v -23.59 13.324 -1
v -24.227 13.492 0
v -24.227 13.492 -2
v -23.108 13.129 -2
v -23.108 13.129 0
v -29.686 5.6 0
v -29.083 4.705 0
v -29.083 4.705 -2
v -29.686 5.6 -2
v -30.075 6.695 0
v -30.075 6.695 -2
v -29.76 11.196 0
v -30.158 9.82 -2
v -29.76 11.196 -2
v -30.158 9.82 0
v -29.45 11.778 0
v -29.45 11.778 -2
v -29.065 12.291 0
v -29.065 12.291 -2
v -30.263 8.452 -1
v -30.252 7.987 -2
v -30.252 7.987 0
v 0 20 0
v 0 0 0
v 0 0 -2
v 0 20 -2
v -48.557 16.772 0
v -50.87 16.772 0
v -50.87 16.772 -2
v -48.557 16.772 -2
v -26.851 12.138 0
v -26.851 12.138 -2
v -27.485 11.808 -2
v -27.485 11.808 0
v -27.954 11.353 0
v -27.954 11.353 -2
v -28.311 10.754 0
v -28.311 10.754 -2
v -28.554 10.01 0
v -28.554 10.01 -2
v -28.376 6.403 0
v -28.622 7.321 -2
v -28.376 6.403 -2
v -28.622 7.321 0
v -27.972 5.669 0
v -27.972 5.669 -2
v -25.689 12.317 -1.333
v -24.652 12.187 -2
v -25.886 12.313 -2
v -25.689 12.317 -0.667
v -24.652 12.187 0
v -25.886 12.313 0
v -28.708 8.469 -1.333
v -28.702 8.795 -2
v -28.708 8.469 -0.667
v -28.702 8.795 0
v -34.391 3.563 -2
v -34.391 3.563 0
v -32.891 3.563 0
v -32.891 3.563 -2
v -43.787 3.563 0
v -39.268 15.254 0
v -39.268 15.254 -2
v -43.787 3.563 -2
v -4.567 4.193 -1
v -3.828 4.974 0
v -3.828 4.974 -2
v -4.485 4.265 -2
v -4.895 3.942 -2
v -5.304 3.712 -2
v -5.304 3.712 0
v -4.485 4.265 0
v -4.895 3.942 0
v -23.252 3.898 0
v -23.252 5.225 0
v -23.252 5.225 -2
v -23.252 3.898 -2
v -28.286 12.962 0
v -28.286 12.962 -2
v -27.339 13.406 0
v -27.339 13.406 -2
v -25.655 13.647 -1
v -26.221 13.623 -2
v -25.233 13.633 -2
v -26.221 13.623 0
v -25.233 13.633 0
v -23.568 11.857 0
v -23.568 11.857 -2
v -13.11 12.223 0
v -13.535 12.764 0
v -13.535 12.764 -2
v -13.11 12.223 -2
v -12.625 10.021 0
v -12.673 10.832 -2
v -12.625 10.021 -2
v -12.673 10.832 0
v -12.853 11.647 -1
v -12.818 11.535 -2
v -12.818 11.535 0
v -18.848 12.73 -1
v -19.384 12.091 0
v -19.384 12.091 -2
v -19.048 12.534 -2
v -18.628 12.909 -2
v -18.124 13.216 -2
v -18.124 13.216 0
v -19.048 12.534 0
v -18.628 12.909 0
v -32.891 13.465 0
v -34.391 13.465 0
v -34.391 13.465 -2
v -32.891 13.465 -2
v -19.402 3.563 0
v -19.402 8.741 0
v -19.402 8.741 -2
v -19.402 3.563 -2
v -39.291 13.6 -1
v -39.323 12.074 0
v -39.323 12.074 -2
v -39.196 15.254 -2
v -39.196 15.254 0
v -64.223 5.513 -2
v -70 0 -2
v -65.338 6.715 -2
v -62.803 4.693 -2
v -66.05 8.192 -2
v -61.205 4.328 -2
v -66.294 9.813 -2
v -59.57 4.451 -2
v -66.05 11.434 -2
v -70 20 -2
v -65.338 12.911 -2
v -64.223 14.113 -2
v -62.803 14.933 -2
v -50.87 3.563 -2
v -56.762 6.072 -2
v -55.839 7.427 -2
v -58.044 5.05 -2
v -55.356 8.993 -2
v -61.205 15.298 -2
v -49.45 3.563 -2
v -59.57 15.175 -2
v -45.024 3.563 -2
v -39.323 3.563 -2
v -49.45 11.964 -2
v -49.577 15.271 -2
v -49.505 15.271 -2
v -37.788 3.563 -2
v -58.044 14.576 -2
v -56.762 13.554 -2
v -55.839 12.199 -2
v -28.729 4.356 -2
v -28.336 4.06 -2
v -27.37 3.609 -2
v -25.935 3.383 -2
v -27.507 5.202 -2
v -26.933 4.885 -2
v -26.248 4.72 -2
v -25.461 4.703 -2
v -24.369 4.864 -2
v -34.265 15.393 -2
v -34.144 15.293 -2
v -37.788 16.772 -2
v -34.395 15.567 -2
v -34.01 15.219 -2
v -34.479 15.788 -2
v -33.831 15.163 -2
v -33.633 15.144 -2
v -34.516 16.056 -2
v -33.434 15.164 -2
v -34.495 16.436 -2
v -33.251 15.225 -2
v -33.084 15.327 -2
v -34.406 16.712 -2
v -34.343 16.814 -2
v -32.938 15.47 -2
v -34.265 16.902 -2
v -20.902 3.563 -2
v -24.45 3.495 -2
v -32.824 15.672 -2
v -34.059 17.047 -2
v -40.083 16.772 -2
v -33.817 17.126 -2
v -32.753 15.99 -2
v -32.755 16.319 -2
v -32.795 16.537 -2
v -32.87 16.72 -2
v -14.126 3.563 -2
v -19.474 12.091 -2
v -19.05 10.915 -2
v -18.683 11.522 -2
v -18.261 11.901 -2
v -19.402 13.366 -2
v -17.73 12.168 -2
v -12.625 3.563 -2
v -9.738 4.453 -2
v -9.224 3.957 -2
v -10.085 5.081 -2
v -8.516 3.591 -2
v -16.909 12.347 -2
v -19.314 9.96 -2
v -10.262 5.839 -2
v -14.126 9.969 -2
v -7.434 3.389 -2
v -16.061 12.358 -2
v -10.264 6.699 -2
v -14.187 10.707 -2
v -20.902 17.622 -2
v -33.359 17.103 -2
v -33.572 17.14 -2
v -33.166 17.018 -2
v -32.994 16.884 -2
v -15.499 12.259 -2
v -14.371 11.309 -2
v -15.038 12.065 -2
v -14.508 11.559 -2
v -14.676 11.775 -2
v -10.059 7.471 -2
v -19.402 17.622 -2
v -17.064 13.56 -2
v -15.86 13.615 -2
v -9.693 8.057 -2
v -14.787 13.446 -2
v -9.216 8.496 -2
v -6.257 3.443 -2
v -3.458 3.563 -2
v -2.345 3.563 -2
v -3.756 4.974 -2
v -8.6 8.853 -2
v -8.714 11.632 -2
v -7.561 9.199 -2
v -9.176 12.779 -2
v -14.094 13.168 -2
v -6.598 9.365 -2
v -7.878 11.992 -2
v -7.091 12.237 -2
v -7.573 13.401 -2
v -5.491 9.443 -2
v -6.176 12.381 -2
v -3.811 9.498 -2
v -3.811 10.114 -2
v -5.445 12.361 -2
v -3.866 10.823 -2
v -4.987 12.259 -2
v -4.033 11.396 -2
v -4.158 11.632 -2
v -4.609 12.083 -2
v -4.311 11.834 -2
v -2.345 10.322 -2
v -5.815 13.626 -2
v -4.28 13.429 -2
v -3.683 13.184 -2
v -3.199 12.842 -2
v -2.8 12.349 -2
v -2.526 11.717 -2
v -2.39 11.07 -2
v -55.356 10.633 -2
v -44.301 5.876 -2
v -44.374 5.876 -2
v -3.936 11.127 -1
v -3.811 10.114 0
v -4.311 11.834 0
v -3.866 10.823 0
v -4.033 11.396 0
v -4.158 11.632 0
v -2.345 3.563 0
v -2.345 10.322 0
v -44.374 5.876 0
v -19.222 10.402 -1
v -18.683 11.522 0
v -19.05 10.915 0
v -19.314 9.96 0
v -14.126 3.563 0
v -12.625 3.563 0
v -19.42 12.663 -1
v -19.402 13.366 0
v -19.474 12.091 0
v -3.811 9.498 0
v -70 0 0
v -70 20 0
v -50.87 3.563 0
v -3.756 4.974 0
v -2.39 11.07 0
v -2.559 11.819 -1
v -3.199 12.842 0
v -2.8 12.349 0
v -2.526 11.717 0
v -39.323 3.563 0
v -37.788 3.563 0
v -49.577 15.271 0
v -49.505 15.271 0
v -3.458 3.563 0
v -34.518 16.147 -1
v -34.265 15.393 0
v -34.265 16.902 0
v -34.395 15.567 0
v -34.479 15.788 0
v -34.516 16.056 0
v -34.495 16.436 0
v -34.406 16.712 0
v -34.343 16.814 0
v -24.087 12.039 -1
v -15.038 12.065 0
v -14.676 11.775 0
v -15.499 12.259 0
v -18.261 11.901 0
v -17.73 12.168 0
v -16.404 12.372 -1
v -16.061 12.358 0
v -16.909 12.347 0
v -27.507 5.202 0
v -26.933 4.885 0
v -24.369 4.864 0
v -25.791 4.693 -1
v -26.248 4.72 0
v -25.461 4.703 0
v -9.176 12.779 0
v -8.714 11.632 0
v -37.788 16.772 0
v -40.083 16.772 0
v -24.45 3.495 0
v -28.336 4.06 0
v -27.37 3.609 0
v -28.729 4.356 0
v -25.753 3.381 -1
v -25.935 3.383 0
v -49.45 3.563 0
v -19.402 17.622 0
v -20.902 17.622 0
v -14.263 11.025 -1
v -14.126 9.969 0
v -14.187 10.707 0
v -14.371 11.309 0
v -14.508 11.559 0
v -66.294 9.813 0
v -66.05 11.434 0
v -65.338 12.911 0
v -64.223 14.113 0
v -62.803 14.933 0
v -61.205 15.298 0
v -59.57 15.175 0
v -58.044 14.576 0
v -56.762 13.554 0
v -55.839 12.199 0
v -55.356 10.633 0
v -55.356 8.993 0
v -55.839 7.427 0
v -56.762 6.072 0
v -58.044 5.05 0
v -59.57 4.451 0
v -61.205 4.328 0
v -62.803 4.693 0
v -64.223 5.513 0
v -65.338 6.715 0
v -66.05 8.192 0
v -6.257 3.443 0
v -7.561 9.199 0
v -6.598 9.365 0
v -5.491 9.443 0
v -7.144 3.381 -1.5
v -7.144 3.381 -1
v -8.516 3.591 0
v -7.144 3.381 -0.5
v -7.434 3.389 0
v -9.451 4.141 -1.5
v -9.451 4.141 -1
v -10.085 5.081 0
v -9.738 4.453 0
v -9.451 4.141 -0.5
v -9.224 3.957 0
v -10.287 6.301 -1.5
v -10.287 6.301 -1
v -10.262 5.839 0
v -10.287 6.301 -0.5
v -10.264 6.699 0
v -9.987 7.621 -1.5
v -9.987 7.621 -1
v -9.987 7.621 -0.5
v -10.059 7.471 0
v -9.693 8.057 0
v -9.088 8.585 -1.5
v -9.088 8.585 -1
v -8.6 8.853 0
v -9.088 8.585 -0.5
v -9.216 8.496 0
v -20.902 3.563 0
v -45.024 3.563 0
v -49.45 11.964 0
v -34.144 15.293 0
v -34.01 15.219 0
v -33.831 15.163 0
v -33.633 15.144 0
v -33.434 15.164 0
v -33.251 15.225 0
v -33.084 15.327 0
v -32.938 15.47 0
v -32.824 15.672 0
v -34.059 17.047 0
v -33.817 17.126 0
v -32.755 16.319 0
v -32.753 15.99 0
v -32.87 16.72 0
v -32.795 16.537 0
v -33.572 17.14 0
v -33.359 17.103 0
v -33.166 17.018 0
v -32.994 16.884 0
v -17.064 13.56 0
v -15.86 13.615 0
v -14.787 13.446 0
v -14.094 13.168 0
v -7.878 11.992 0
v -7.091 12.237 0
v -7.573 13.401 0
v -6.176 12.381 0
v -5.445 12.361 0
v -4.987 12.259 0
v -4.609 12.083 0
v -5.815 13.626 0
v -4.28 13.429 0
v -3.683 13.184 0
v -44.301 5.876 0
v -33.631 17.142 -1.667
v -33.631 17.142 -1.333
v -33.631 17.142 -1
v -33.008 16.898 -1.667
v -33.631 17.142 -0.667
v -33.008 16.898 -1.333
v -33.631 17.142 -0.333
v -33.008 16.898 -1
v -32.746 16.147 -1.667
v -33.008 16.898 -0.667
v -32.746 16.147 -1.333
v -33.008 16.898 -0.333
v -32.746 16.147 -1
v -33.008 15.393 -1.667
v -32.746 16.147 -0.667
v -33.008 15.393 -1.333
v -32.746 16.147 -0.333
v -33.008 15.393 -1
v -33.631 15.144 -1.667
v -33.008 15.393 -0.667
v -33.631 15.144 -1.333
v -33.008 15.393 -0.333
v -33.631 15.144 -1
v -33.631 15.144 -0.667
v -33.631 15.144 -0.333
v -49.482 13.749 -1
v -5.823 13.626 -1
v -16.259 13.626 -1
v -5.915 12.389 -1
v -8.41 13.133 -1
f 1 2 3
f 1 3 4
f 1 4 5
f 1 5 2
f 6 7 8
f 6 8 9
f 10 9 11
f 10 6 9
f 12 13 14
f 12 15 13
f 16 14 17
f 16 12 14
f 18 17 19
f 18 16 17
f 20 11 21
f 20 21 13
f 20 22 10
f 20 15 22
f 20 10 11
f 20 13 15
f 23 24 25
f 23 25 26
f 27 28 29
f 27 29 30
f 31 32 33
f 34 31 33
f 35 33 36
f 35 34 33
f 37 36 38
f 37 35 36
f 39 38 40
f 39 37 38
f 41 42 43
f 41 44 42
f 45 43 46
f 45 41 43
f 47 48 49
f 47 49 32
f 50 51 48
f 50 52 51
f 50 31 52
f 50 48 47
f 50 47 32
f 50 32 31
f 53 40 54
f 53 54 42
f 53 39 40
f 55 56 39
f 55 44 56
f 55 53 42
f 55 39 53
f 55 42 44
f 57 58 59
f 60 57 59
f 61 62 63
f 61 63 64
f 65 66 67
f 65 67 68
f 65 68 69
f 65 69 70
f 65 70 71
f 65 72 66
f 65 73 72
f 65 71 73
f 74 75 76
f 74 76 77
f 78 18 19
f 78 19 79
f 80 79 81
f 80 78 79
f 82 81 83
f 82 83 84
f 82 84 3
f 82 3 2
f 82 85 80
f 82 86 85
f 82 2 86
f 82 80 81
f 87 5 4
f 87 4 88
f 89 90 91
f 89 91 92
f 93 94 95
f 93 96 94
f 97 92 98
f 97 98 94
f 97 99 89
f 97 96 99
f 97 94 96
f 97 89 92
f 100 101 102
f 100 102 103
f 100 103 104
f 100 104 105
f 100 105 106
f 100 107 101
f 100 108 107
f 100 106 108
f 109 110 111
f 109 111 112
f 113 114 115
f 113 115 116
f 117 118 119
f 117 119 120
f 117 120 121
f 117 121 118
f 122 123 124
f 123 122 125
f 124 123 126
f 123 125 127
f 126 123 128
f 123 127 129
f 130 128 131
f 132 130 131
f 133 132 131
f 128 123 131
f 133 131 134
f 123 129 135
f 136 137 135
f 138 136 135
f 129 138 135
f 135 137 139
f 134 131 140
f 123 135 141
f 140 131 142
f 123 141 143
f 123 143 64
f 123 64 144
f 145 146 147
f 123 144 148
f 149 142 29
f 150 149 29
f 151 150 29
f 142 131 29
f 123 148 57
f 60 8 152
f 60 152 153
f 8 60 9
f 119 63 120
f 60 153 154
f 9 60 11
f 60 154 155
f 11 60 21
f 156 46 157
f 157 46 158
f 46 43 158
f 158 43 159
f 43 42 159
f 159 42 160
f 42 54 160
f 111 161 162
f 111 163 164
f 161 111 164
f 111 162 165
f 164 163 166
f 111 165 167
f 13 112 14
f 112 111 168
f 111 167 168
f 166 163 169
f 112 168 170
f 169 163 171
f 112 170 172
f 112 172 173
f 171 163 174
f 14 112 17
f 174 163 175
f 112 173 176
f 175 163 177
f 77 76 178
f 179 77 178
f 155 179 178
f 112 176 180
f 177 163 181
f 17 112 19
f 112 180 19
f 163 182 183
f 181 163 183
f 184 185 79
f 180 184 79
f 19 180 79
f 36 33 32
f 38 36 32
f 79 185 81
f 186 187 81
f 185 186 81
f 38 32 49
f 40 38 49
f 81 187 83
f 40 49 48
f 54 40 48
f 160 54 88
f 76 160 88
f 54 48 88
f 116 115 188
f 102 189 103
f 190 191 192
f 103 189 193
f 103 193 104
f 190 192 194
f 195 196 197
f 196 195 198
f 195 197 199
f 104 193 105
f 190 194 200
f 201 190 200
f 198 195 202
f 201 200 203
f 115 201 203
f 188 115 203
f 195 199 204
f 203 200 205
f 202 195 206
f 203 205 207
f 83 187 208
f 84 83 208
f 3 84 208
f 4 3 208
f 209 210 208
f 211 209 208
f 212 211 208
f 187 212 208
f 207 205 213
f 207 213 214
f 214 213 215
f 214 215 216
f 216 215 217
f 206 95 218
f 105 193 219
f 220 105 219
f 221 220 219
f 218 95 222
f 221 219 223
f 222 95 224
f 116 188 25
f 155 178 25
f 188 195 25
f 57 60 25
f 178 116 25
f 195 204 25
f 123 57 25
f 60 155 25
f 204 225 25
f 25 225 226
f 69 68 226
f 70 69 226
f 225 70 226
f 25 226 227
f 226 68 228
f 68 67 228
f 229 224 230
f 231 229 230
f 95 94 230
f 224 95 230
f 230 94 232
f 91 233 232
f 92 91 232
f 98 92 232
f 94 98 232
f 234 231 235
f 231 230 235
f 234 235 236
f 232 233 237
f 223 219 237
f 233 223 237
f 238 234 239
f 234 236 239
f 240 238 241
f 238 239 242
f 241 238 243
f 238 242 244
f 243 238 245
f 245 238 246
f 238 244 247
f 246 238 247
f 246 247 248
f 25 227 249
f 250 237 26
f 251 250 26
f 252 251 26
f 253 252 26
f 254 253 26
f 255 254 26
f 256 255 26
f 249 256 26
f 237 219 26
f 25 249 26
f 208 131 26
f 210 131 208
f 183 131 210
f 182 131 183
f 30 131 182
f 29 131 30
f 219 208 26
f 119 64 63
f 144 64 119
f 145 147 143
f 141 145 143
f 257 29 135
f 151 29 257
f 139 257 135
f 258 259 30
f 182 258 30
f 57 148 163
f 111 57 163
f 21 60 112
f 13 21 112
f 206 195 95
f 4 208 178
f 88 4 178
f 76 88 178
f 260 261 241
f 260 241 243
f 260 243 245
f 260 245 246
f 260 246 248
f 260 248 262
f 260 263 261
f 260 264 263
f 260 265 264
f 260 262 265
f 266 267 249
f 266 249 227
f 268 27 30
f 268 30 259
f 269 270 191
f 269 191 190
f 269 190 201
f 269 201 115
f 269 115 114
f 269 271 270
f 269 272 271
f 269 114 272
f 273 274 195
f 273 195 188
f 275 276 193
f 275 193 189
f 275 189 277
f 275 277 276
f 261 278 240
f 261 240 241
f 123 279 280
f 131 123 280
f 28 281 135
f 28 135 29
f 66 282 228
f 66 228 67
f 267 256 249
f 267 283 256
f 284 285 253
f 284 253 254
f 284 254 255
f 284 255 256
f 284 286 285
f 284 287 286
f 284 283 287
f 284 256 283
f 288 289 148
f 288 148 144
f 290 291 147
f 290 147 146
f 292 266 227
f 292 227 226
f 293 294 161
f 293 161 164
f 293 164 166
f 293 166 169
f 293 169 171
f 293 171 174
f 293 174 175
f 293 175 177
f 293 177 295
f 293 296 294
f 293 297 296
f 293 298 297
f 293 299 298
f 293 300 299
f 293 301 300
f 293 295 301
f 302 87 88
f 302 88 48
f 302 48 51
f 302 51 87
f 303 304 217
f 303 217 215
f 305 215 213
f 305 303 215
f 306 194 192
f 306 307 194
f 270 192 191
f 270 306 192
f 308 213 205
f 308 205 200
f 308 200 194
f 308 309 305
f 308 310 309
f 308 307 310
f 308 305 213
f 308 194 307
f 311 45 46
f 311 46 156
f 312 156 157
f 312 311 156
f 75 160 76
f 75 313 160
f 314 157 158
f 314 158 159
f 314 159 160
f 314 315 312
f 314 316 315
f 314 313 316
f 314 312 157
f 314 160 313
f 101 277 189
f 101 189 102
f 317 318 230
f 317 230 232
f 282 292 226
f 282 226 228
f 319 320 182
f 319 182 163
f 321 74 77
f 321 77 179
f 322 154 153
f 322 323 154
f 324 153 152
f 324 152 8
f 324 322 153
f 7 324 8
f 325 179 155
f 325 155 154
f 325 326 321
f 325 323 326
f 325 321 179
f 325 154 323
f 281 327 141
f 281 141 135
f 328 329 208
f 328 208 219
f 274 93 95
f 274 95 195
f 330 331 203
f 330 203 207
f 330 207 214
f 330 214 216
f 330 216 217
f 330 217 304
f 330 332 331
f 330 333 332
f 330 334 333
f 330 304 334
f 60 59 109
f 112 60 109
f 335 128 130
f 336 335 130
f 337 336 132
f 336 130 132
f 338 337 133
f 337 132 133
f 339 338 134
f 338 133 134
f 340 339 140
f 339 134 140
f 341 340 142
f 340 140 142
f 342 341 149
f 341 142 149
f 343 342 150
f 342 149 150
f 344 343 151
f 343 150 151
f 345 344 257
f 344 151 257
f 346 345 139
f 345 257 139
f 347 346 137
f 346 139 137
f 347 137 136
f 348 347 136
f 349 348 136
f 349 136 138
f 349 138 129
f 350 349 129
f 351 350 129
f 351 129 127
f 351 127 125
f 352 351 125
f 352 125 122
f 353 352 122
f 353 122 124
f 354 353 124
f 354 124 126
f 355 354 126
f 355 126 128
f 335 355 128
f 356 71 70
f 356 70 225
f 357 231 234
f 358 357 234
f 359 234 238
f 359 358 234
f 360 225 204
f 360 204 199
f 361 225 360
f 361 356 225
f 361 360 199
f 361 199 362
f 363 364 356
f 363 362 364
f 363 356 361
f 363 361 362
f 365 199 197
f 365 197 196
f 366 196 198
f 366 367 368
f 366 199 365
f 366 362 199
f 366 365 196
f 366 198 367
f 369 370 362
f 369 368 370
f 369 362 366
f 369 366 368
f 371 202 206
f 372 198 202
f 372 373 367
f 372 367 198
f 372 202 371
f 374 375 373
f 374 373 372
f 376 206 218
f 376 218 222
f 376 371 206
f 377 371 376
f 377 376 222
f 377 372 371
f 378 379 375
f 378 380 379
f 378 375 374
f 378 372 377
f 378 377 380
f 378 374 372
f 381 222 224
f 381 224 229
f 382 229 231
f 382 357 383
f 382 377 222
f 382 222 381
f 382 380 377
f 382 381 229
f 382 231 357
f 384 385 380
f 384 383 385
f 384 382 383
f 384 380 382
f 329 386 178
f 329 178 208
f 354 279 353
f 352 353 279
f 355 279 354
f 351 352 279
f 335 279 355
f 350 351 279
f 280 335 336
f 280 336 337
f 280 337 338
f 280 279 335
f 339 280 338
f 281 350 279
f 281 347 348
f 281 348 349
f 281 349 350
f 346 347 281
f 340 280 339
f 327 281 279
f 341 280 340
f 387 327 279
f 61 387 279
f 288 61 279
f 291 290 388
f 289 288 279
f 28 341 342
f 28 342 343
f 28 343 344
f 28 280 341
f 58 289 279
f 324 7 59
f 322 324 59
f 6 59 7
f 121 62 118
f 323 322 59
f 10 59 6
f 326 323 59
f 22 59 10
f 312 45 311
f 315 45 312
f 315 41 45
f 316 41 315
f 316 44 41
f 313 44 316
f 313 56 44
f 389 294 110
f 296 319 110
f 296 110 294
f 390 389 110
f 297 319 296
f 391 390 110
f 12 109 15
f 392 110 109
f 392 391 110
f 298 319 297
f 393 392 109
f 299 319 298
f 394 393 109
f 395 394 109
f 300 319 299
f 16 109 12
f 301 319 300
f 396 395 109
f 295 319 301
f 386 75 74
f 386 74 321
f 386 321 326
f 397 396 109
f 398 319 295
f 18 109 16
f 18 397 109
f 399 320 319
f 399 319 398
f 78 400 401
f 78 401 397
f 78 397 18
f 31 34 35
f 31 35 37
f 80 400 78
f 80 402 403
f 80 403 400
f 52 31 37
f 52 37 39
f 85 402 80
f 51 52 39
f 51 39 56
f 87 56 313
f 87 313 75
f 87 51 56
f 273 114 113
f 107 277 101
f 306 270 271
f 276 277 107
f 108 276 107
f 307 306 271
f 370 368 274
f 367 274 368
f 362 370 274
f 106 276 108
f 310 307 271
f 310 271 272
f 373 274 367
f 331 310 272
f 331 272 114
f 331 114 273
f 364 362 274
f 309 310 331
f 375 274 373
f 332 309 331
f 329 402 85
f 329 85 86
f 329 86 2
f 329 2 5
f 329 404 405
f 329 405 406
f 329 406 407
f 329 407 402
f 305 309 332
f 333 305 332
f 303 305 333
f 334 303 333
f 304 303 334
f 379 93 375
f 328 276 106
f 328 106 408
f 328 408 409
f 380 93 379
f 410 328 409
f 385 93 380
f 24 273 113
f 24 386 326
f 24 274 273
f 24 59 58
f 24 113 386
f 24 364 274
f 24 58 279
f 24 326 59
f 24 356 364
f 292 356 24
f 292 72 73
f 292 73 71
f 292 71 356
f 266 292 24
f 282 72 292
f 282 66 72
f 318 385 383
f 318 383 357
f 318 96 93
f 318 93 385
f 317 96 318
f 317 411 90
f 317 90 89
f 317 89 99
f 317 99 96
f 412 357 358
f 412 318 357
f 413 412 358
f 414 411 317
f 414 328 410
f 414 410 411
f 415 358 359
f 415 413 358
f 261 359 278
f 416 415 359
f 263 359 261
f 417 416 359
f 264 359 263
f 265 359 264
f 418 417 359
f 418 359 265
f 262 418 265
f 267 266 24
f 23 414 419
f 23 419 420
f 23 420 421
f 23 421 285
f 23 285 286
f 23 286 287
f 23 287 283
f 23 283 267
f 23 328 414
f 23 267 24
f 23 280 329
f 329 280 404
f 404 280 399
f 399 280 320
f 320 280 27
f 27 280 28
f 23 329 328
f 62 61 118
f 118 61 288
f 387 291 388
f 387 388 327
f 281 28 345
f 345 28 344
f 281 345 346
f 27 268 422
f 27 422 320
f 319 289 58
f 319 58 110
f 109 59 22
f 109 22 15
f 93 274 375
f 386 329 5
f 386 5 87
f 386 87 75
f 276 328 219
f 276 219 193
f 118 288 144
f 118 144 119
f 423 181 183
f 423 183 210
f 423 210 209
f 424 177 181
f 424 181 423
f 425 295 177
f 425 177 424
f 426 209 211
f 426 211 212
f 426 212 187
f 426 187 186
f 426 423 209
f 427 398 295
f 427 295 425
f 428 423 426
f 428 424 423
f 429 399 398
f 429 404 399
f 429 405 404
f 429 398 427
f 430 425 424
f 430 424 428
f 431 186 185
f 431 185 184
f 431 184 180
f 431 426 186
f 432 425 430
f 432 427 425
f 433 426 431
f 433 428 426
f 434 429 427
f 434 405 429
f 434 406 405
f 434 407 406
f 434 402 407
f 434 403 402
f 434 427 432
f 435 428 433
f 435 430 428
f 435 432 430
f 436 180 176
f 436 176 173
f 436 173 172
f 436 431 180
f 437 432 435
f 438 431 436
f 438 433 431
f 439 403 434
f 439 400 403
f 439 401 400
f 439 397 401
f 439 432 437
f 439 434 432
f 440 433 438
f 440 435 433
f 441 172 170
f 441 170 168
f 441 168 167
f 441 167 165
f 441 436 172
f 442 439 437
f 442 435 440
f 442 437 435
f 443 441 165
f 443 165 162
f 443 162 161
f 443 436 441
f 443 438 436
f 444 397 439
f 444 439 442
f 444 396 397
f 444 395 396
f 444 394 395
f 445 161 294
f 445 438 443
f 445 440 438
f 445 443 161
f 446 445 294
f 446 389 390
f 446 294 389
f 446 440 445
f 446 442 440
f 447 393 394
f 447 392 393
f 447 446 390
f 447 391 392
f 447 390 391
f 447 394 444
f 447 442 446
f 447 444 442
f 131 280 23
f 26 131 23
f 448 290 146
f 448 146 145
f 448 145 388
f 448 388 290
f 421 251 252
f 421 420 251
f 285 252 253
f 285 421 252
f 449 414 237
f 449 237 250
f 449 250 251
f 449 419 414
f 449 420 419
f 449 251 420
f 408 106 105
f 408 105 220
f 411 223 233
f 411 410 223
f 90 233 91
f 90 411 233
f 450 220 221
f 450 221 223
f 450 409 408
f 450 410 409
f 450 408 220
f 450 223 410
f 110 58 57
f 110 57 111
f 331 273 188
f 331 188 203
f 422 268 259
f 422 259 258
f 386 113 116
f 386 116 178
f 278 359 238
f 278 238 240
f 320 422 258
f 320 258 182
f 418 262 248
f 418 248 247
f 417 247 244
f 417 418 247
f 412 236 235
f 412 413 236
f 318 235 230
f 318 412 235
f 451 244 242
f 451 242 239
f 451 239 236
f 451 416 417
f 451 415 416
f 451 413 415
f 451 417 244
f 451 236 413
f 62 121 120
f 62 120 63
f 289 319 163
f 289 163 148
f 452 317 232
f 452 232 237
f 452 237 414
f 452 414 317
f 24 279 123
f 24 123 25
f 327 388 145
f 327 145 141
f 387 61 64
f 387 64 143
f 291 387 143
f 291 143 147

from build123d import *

# Parameters (mm, degrees)
F0_W     = 70
F0_H     = 20
F0_W_2   = 1.5003956149
F0_H_2   = 9.901454684
F2_DEPTH = 2
F3_D     = 11
F3_DEPTH = 17
F3_TIP   = 3.3047334047


with BuildPart() as f2:
    # F0 (on Top) → F2 (new body)
    with BuildSketch(Plane.XY):
        with Locations((-35, 10)):
            Rectangle(F0_W, F0_H)
        with Locations((-33.6410080478, 8.5138517956)):
            Rectangle(F0_W_2, F0_H_2, mode=Mode.SUBTRACT)
        with BuildLine():
            add(Edge.make_bspline(
                [(-23.2524307027, 3.8984729919), (-24.244021639, 3.3809955062), (-25.7530900609, 3.3809955062)],
                knots=[0, 0, 0, 1, 1, 1], degree=2))
            add(Edge.make_bspline(
                [(-25.7530900609, 3.3809955062), (-27.9039462025, 3.3809955062), (-29.0834479575, 4.7050440449)],
                knots=[0, 0, 0, 1, 1, 1], degree=2))
            add(Edge.make_bspline(
                [(-29.0834479575, 4.7050440449), (-30.2629497126, 6.0290925837), (-30.2629497126, 8.4516966786)],
                knots=[0, 0, 0, 1, 1, 1], degree=2))
            add(Edge.make_bspline(
                [(-30.2629497126, 8.4516966786), (-30.2629497126, 10.9350104228), (-29.0646568756, 12.2908592539)],
                knots=[0, 0, 0, 1, 1, 1], degree=2))
            add(Edge.make_bspline(
                [(-29.0646568756, 12.2908592539), (-27.8663640387, 13.6467080851), (-25.654798248, 13.6467080851)],
                knots=[0, 0, 0, 1, 1, 1], degree=2))
            add(Edge.make_bspline(
                [(-25.654798248, 13.6467080851), (-24.9407371365, 13.6467080851), (-24.2266760249, 13.4920430265)],
                knots=[0, 0, 0, 1, 1, 1], degree=2))
            add(Edge.make_bspline(
                [(-24.2266760249, 13.4920430265), (-23.5126149134, 13.337377968), (-23.107883919, 13.1292305994)],
                knots=[0, 0, 0, 1, 1, 1], degree=2))
            Line((-23.107883919, 13.1292305994), (-23.5675426912, 11.8572189028))
            add(Edge.make_bspline(
                [(-23.5675426912, 11.8572189028), (-24.0647836272, 12.0566934643), (-24.651643569, 12.1867855697)],
                knots=[0, 0, 0, 1, 1, 1], degree=2))
            add(Edge.make_bspline(
                [(-24.651643569, 12.1867855697), (-25.2385035109, 12.316877675), (-25.6894894761, 12.316877675)],
                knots=[0, 0, 0, 1, 1, 1], degree=2))
            add(Edge.make_bspline(
                [(-25.6894894761, 12.316877675), (-28.7076263199, 12.316877675), (-28.7076263199, 8.4690422927)],
                knots=[0, 0, 0, 1, 1, 1], degree=2))
            add(Edge.make_bspline(
                [(-28.7076263199, 8.4690422927), (-28.7076263199, 6.6448618823), (-27.9718831908, 5.6691710923)],
                knots=[0, 0, 0, 1, 1, 1], degree=2))
            add(Edge.make_bspline(
                [(-27.9718831908, 5.6691710923), (-27.2361400617, 4.6934803022), (-25.7906722247, 4.6934803022)],
                knots=[0, 0, 0, 1, 1, 1], degree=2))
            add(Edge.make_bspline(
                [(-25.7906722247, 4.6934803022), (-24.5533517561, 4.6934803022), (-23.2524307027, 5.2254124663)],
                knots=[0, 0, 0, 1, 1, 1], degree=2))
            Line((-23.2524307027, 5.2254124663), (-23.2524307027, 3.8984729919))
        make_face(mode=Mode.SUBTRACT)
        with BuildLine():
            Line((-2.3451839072, 3.5631244536), (-3.4581941418, 3.5631244536))
            Line((-3.4581941418, 3.5631244536), (-3.7559605162, 4.9739010626))
            Line((-3.7559605162, 4.9739010626), (-3.8282339081, 4.9739010626))
            add(Edge.make_bspline(
                [(-3.8282339081, 4.9739010626), (-4.5683134407, 4.0430197756), (-5.3040565697, 3.7120076409)],
                knots=[0, 0, 0, 1, 1, 1], degree=2))
            add(Edge.make_bspline(
                [(-5.3040565697, 3.7120076409), (-6.0397996988, 3.3809955062), (-7.1441371263, 3.3809955062)],
                knots=[0, 0, 0, 1, 1, 1], degree=2))
            add(Edge.make_bspline(
                [(-7.1441371263, 3.3809955062), (-8.6156233845, 3.3809955062), (-9.4511037943, 4.1413115885)],
                knots=[0, 0, 0, 1, 1, 1], degree=2))
            add(Edge.make_bspline(
                [(-9.4511037943, 4.1413115885), (-10.2865842041, 4.9016276708), (-10.2865842041, 6.3008405371)],
                knots=[0, 0, 0, 1, 1, 1], degree=2))
            add(Edge.make_bspline(
                [(-10.2865842041, 6.3008405371), (-10.2865842041, 9.2987408312), (-5.4905219207, 9.4432876149)],
                knots=[0, 0, 0, 1, 1, 1], degree=2))
            Line((-5.4905219207, 9.4432876149), (-3.810888294, 9.4982153927))
            Line((-3.810888294, 9.4982153927), (-3.810888294, 10.1139846913))
            add(Edge.make_bspline(
                [(-3.810888294, 10.1139846913), (-3.810888294, 11.279031768), (-4.3110201657, 11.8340914174)],
                knots=[0, 0, 0, 1, 1, 1], degree=2))
            add(Edge.make_bspline(
                [(-4.3110201657, 11.8340914174), (-4.8111520373, 12.3891510669), (-5.9154894648, 12.3891510669)],
                knots=[0, 0, 0, 1, 1, 1], degree=2))
            add(Edge.make_bspline(
                [(-5.9154894648, 12.3891510669), (-7.1528099334, 12.3891510669), (-8.7139151974, 11.6317259202)],
                knots=[0, 0, 0, 1, 1, 1], degree=2))
            Line((-8.7139151974, 11.6317259202), (-9.1764649053, 12.7794273829))
            add(Edge.make_bspline(
                [(-9.1764649053, 12.7794273829), (-8.4450581797, 13.1754855702), (-7.5734410739, 13.4009785528)],
                knots=[0, 0, 0, 1, 1, 1], degree=2))
            add(Edge.make_bspline(
                [(-7.5734410739, 13.4009785528), (-6.7018239682, 13.6264715354), (-5.8229795232, 13.6264715354)],
                knots=[0, 0, 0, 1, 1, 1], degree=2))
            add(Edge.make_bspline(
                [(-5.8229795232, 13.6264715354), (-4.0537268907, 13.6264715354), (-3.1994553989, 12.8415824999)],
                knots=[0, 0, 0, 1, 1, 1], degree=2))
            add(Edge.make_bspline(
                [(-3.1994553989, 12.8415824999), (-2.3451839072, 12.0566934643), (-2.3451839072, 10.3221320598)],
                knots=[0, 0, 0, 1, 1, 1], degree=2))
            Line((-2.3451839072, 10.3221320598), (-2.3451839072, 3.5631244536))
        make_face(mode=Mode.SUBTRACT)
        with BuildLine():
            Line((-43.7867467963, 3.5631244536), (-45.0240672648, 3.5631244536))
            Line((-45.0240672648, 3.5631244536), (-49.5050175598, 15.271413934))
            Line((-49.5050175598, 15.271413934), (-49.5772909516, 15.271413934))
            add(Edge.make_bspline(
                [(-49.5772909516, 15.271413934), (-49.450089782, 13.8808738747), (-49.450089782, 11.9641835228)],
                knots=[0, 0, 0, 1, 1, 1], degree=2))
            Line((-49.450089782, 11.9641835228), (-49.450089782, 3.5631244536))
            Line((-49.450089782, 3.5631244536), (-50.869539198, 3.5631244536))
            Line((-50.869539198, 3.5631244536), (-50.869539198, 16.7718095489))
            Line((-50.869539198, 16.7718095489), (-48.5567906586, 16.7718095489))
            Line((-48.5567906586, 16.7718095489), (-44.3736067381, 5.875872993))
            Line((-44.3736067381, 5.875872993), (-44.3013333463, 5.875872993))
            Line((-44.3013333463, 5.875872993), (-40.0834581977, 16.7718095489))
            Line((-40.0834581977, 16.7718095489), (-37.7880552724, 16.7718095489))
            Line((-37.7880552724, 16.7718095489), (-37.7880552724, 3.5631244536))
            Line((-37.7880552724, 3.5631244536), (-39.3231421154, 3.5631244536))
            Line((-39.3231421154, 3.5631244536), (-39.3231421154, 12.0740390784))
            add(Edge.make_bspline(
                [(-39.3231421154, 12.0740390784), (-39.3231421154, 13.5368525295), (-39.1959409457, 15.2540683199)],
                knots=[0, 0, 0, 1, 1, 1], degree=2))
            Line((-39.1959409457, 15.2540683199), (-39.2682143376, 15.2540683199))
            Line((-39.2682143376, 15.2540683199), (-43.7867467963, 3.5631244536))
        make_face(mode=Mode.SUBTRACT)
        with BuildLine():
            Line((-12.6253511645, 3.5631244536), (-14.1257467794, 3.5631244536))
            Line((-14.1257467794, 3.5631244536), (-14.1257467794, 9.9694379076))
            add(Edge.make_bspline(
                [(-14.1257467794, 9.9694379076), (-14.1257467794, 11.1778490194), (-14.6764700254, 11.7748272361)],
                knots=[0, 0, 0, 1, 1, 1], degree=2))
            add(Edge.make_bspline(
                [(-14.6764700254, 11.7748272361), (-15.2271932713, 12.3718054528), (-16.4038040907, 12.3718054528)],
                knots=[0, 0, 0, 1, 1, 1], degree=2))
            add(Edge.make_bspline(
                [(-16.4038040907, 12.3718054528), (-17.9649093547, 12.3718054528), (-18.6833068697, 11.5218703646)],
                knots=[0, 0, 0, 1, 1, 1], degree=2))
            add(Edge.make_bspline(
                [(-18.6833068697, 11.5218703646), (-19.4017043848, 10.6719352764), (-19.4017043848, 8.7407902461)],
                knots=[0, 0, 0, 1, 1, 1], degree=2))
            Line((-19.4017043848, 8.7407902461), (-19.4017043848, 3.5631244536))
            Line((-19.4017043848, 3.5631244536), (-20.9020999997, 3.5631244536))
            Line((-20.9020999997, 3.5631244536), (-20.9020999997, 17.6217446371))
            Line((-20.9020999997, 17.6217446371), (-19.4017043848, 17.6217446371))
            Line((-19.4017043848, 17.6217446371), (-19.4017043848, 13.3662873247))
            add(Edge.make_bspline(
                [(-19.4017043848, 13.3662873247), (-19.4017043848, 12.5972984354), (-19.4739777766, 12.0913846924)],
                knots=[0, 0, 0, 1, 1, 1], degree=2))
            Line((-19.4739777766, 12.0913846924), (-19.3843587707, 12.0913846924))
            add(Edge.make_bspline(
                [(-19.3843587707, 12.0913846924), (-18.9420456126, 12.8054458039), (-18.1239108168, 13.2159586697)],
                knots=[0, 0, 0, 1, 1, 1], degree=2))
            add(Edge.make_bspline(
                [(-18.1239108168, 13.2159586697), (-17.305776021, 13.6264715354), (-16.259257307, 13.6264715354)],
                knots=[0, 0, 0, 1, 1, 1], degree=2))
            add(Edge.make_bspline(
                [(-16.259257307, 13.6264715354), (-14.4437497036, 13.6264715354), (-13.5345504341, 12.7635272367)],
                knots=[0, 0, 0, 1, 1, 1], degree=2))
            add(Edge.make_bspline(
                [(-13.5345504341, 12.7635272367), (-12.6253511645, 11.9005829379), (-12.6253511645, 10.0214747497)],
                knots=[0, 0, 0, 1, 1, 1], degree=2))
            Line((-12.6253511645, 10.0214747497), (-12.6253511645, 3.5631244536))
        make_face(mode=Mode.SUBTRACT)
        with BuildLine():
            add(Edge.make_bspline(
                [(-34.2654501534, 15.3928332323), (-34.5184070249, 15.6414537003), (-34.5184070249, 16.1473674433)],
                knots=[0, 0, 0, 1, 1, 1], degree=2))
            add(Edge.make_bspline(
                [(-34.5184070249, 16.1473674433), (-34.5184070249, 16.6619539933), (-34.2654501534, 16.9019016542)],
                knots=[0, 0, 0, 1, 1, 1], degree=2))
            add(Edge.make_bspline(
                [(-34.2654501534, 16.9019016542), (-34.012493282, 17.1418493152), (-33.630889773, 17.1418493152)],
                knots=[0, 0, 0, 1, 1, 1], degree=2))
            add(Edge.make_bspline(
                [(-33.630889773, 17.1418493152), (-33.2695228137, 17.1418493152), (-33.0078931352, 16.8975652507)],
                knots=[0, 0, 0, 1, 1, 1], degree=2))
            add(Edge.make_bspline(
                [(-33.0078931352, 16.8975652507), (-32.7462634567, 16.6532811862), (-32.7462634567, 16.1473674433)],
                knots=[0, 0, 0, 1, 1, 1], degree=2))
            add(Edge.make_bspline(
                [(-32.7462634567, 16.1473674433), (-32.7462634567, 15.6414537003), (-33.0078931352, 15.3928332323)],
                knots=[0, 0, 0, 1, 1, 1], degree=2))
            add(Edge.make_bspline(
                [(-33.0078931352, 15.3928332323), (-33.2695228137, 15.1442127643), (-33.630889773, 15.1442127643)],
                knots=[0, 0, 0, 1, 1, 1], degree=2))
            add(Edge.make_bspline(
                [(-33.630889773, 15.1442127643), (-34.012493282, 15.1442127643), (-34.2654501534, 15.3928332323)],
                knots=[0, 0, 0, 1, 1, 1], degree=2))
        make_face(mode=Mode.SUBTRACT)
    extrude(amount=-F2_DEPTH)

    # F3
    with Locations(Plane.XY):
        with Locations((-60.7941076159, 9.8129231483)):
            Hole(F3_D / 2, depth=F3_DEPTH)
            with Locations((0, 0, -(F3_DEPTH + F3_TIP / 2))):  # 118° drill point
                Cone(0, F3_D / 2, F3_TIP, mode=Mode.SUBTRACT)


solid = f2.part
